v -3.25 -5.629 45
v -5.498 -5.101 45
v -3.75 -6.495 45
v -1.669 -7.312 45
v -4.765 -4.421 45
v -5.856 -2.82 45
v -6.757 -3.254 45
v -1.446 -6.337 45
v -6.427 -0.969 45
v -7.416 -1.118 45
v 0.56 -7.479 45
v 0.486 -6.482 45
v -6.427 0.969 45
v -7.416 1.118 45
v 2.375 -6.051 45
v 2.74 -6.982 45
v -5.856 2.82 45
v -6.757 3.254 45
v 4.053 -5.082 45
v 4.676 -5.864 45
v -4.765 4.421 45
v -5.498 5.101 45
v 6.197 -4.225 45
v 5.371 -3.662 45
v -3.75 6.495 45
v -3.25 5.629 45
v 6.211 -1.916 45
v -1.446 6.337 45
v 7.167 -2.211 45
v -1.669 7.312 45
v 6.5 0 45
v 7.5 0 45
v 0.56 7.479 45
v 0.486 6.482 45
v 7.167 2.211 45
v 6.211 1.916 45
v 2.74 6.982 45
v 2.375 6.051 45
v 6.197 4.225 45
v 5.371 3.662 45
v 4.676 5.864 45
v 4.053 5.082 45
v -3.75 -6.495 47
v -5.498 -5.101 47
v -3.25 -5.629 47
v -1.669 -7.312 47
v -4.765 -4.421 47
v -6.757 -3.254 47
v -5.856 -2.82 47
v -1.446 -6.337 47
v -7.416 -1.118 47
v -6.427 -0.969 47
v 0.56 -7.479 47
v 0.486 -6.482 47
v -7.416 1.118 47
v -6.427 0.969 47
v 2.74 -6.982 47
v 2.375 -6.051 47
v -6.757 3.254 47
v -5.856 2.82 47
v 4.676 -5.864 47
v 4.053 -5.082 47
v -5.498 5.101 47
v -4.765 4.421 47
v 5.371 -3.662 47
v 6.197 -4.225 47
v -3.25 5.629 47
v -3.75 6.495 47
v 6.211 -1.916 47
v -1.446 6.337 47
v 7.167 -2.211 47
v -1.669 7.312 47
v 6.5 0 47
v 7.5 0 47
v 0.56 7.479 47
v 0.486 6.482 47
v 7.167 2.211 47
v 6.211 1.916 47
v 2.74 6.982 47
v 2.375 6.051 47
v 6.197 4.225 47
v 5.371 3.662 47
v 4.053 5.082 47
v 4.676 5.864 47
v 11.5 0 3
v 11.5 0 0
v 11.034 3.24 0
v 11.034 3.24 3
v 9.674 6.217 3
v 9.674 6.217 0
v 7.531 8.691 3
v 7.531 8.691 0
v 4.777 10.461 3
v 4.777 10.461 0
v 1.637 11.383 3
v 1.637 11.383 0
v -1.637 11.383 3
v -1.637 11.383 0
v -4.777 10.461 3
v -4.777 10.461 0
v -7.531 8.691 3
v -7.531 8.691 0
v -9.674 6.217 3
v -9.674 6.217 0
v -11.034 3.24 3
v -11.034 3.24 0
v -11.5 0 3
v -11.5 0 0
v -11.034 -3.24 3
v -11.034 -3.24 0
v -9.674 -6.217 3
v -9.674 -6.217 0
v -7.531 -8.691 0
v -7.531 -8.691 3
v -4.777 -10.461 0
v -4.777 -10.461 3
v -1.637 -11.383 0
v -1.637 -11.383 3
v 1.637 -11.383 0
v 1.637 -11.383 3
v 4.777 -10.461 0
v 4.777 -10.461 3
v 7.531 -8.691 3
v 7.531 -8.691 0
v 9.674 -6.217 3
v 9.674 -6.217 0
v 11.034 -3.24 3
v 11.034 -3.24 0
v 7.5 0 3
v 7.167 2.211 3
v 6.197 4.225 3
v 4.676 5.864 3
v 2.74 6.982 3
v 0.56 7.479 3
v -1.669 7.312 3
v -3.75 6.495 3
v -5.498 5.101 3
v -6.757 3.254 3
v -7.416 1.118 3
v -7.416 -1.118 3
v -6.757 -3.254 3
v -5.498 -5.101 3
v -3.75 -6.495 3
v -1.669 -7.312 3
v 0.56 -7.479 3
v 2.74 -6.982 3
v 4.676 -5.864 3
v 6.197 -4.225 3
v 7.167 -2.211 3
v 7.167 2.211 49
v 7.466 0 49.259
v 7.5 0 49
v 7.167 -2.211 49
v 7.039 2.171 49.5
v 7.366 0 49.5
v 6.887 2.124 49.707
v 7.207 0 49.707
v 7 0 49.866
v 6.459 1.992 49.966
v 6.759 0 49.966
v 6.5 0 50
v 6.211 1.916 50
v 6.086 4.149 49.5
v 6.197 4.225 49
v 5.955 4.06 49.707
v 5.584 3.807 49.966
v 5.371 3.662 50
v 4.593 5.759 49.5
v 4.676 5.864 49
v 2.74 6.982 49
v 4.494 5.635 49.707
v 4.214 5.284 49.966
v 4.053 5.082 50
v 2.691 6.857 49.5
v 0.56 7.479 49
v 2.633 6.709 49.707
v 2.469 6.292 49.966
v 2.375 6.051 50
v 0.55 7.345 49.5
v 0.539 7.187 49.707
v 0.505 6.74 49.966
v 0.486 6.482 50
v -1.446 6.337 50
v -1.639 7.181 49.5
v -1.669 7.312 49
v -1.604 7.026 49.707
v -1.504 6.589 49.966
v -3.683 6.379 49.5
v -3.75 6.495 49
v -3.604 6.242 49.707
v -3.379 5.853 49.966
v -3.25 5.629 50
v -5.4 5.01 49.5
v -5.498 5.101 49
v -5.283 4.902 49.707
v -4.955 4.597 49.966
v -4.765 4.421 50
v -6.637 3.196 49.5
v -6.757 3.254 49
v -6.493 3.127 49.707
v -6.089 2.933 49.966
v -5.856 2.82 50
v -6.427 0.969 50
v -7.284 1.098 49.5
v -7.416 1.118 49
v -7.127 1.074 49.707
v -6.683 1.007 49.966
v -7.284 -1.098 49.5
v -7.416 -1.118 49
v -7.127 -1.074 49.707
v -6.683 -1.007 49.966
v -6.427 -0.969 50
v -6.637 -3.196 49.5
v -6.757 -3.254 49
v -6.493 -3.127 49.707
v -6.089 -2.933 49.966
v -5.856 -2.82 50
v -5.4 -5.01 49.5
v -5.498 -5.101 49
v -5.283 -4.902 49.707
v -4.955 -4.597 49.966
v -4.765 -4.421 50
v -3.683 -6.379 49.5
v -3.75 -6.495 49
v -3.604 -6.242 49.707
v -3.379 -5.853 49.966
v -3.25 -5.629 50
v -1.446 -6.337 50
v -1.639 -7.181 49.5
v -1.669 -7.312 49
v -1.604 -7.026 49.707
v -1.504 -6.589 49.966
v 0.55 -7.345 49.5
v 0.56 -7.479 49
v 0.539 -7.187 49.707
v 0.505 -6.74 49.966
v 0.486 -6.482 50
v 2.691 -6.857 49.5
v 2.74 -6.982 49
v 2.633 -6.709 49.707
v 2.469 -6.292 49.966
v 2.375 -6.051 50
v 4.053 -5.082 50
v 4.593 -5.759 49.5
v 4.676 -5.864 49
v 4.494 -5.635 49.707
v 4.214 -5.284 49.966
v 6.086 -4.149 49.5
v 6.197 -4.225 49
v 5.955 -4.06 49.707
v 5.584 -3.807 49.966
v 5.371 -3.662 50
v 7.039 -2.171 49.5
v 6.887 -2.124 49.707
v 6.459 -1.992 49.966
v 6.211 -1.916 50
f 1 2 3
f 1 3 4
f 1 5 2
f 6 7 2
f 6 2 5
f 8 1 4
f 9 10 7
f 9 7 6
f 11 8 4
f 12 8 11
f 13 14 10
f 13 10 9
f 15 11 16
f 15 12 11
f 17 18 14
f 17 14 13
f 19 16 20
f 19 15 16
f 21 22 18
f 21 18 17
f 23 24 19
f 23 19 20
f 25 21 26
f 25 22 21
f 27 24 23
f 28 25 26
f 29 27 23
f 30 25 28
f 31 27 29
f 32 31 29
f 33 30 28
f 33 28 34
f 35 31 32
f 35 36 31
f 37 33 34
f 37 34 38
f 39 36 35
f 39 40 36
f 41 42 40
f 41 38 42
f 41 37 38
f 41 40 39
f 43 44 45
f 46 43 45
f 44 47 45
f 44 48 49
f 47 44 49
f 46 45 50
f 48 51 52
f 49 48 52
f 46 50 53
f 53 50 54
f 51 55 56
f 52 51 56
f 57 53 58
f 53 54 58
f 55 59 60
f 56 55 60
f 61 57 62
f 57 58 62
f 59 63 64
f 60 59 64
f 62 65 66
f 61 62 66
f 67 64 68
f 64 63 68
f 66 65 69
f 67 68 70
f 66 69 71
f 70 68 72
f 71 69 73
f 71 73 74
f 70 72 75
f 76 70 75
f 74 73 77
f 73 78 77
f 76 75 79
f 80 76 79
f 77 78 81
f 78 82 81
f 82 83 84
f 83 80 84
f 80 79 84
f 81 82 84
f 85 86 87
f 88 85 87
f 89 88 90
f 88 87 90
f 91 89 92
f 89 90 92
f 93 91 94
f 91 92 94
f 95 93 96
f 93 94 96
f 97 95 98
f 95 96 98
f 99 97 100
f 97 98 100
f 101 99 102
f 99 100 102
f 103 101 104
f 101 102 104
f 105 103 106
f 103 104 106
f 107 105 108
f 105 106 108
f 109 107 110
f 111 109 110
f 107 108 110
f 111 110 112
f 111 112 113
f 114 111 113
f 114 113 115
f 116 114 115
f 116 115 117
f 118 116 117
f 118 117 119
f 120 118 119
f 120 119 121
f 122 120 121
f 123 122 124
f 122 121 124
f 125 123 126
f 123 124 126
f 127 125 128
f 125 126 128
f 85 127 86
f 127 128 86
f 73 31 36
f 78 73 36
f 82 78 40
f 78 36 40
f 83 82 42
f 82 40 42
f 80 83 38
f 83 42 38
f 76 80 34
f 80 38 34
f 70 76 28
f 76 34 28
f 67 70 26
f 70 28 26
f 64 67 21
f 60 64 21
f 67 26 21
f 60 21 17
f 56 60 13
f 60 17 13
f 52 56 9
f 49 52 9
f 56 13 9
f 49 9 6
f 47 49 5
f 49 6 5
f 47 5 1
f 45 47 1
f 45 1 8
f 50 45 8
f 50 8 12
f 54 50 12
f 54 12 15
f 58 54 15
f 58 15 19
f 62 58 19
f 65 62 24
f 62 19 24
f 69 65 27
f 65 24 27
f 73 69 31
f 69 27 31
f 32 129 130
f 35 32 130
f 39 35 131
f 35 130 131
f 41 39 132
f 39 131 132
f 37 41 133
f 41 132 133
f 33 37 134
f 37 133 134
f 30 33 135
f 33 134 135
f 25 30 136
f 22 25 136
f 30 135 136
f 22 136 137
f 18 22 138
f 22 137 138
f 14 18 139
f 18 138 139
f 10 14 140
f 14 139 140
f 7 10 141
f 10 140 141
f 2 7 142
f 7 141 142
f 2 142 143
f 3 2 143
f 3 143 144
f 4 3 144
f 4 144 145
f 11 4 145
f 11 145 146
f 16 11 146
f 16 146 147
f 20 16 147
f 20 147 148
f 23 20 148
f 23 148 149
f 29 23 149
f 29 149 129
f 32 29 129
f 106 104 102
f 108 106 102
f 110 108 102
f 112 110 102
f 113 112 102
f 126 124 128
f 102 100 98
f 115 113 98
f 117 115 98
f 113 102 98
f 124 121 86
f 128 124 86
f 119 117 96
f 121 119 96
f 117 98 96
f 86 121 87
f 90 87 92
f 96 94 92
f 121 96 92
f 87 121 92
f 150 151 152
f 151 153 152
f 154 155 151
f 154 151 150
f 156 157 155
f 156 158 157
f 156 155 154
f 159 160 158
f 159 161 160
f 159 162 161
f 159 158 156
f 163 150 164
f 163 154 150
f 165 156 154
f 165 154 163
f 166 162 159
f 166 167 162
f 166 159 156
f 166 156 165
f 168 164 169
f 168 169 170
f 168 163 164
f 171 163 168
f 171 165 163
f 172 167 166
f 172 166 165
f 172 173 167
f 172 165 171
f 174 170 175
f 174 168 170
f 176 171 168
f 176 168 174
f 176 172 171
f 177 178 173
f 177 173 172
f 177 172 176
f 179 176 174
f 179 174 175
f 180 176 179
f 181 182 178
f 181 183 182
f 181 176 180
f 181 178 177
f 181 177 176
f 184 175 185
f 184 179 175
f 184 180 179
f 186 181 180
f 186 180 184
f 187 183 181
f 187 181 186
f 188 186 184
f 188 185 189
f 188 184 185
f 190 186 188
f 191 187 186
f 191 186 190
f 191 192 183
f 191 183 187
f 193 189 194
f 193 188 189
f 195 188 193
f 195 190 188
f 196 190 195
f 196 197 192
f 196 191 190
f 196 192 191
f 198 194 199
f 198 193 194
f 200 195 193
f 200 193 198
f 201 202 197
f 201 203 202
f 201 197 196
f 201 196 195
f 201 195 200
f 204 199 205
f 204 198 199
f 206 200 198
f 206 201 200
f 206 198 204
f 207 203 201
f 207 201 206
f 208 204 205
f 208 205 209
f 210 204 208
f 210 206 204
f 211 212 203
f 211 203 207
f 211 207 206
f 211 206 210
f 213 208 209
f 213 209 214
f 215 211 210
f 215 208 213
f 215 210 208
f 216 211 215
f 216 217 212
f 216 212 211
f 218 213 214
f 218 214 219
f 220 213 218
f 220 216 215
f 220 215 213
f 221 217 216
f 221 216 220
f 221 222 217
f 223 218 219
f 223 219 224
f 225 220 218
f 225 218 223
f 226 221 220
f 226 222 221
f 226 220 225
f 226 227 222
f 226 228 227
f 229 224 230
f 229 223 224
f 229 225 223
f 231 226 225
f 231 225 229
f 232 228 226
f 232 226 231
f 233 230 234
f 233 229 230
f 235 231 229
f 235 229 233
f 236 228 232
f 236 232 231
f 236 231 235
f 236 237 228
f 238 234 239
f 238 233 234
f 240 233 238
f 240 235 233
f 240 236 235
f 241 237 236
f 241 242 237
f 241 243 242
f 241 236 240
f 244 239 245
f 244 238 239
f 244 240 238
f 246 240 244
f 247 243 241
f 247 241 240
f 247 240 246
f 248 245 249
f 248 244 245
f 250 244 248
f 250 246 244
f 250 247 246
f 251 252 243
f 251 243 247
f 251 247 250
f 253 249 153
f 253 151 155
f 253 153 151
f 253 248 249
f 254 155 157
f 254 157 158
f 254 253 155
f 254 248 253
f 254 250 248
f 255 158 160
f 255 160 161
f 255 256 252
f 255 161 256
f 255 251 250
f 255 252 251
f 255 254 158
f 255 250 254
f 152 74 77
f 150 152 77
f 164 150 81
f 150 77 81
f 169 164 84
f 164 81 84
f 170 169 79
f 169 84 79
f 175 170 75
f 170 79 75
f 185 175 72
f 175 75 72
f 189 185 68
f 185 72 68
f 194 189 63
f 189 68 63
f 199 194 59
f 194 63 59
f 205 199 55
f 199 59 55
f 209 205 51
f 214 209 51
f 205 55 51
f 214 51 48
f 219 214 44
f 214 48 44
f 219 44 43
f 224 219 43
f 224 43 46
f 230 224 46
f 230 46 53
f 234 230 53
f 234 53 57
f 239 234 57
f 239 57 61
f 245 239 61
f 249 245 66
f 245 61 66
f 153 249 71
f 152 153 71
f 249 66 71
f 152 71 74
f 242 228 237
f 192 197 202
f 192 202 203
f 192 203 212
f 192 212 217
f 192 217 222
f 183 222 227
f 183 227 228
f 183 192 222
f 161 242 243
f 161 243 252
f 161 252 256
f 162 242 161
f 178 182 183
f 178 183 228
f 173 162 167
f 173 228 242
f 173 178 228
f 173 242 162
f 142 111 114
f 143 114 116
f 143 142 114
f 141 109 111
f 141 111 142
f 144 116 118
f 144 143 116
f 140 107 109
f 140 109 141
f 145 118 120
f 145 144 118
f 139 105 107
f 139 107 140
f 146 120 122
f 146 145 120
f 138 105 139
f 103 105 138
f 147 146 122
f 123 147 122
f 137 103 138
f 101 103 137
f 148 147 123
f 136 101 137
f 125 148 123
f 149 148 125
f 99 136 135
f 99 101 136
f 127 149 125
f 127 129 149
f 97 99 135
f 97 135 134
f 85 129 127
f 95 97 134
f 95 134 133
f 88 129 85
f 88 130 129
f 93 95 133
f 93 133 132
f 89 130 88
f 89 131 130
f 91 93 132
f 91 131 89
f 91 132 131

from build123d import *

# Parameters (mm, degrees)
ESQUISSE1_R        = 7.5
BOSS_EXTRU_1_DEPTH = 45
ESQUISSE2_R        = 11.5
BOSS_EXTRU_2_DEPTH = 3
BOSS_EXTRU_3_START = 45
ESQUISSE3_R        = 6.5
BOSS_EXTRU_3_DEPTH = 2
BOSS_EXTRU_4_START = 47
ESQUISSE4_R        = 7.5
BOSS_EXTRU_4_DEPTH = 3
CONG_1_R           = 1


with BuildPart() as part:
    # Esquisse1 → Boss.-Extru.1 (new body)
    with BuildSketch(Plane.XY):
        Circle(ESQUISSE1_R)
    extrude(amount=BOSS_EXTRU_1_DEPTH)

    # Esquisse2 → Boss.-Extru.2 (add)
    with BuildSketch(Plane.XY):
        Circle(ESQUISSE2_R)
    extrude(amount=BOSS_EXTRU_2_DEPTH)

    # Esquisse3 → Boss.-Extru.3 (add)
    with BuildSketch(Plane.XY.offset(BOSS_EXTRU_3_START)):
        Circle(ESQUISSE3_R)
    extrude(amount=BOSS_EXTRU_3_DEPTH)

    # Esquisse4 → Boss.-Extru.4 (add)
    with BuildSketch(Plane.XY.offset(BOSS_EXTRU_4_START)):
        Circle(ESQUISSE4_R)
    extrude(amount=BOSS_EXTRU_4_DEPTH)

    # Congé1
    cong_1_edges = [part.edges().sort_by_distance(p)[0] for p in [
        (-7.5, 0, 50),
    ]]
    fillet(cong_1_edges, radius=CONG_1_R)


solid = part.part
